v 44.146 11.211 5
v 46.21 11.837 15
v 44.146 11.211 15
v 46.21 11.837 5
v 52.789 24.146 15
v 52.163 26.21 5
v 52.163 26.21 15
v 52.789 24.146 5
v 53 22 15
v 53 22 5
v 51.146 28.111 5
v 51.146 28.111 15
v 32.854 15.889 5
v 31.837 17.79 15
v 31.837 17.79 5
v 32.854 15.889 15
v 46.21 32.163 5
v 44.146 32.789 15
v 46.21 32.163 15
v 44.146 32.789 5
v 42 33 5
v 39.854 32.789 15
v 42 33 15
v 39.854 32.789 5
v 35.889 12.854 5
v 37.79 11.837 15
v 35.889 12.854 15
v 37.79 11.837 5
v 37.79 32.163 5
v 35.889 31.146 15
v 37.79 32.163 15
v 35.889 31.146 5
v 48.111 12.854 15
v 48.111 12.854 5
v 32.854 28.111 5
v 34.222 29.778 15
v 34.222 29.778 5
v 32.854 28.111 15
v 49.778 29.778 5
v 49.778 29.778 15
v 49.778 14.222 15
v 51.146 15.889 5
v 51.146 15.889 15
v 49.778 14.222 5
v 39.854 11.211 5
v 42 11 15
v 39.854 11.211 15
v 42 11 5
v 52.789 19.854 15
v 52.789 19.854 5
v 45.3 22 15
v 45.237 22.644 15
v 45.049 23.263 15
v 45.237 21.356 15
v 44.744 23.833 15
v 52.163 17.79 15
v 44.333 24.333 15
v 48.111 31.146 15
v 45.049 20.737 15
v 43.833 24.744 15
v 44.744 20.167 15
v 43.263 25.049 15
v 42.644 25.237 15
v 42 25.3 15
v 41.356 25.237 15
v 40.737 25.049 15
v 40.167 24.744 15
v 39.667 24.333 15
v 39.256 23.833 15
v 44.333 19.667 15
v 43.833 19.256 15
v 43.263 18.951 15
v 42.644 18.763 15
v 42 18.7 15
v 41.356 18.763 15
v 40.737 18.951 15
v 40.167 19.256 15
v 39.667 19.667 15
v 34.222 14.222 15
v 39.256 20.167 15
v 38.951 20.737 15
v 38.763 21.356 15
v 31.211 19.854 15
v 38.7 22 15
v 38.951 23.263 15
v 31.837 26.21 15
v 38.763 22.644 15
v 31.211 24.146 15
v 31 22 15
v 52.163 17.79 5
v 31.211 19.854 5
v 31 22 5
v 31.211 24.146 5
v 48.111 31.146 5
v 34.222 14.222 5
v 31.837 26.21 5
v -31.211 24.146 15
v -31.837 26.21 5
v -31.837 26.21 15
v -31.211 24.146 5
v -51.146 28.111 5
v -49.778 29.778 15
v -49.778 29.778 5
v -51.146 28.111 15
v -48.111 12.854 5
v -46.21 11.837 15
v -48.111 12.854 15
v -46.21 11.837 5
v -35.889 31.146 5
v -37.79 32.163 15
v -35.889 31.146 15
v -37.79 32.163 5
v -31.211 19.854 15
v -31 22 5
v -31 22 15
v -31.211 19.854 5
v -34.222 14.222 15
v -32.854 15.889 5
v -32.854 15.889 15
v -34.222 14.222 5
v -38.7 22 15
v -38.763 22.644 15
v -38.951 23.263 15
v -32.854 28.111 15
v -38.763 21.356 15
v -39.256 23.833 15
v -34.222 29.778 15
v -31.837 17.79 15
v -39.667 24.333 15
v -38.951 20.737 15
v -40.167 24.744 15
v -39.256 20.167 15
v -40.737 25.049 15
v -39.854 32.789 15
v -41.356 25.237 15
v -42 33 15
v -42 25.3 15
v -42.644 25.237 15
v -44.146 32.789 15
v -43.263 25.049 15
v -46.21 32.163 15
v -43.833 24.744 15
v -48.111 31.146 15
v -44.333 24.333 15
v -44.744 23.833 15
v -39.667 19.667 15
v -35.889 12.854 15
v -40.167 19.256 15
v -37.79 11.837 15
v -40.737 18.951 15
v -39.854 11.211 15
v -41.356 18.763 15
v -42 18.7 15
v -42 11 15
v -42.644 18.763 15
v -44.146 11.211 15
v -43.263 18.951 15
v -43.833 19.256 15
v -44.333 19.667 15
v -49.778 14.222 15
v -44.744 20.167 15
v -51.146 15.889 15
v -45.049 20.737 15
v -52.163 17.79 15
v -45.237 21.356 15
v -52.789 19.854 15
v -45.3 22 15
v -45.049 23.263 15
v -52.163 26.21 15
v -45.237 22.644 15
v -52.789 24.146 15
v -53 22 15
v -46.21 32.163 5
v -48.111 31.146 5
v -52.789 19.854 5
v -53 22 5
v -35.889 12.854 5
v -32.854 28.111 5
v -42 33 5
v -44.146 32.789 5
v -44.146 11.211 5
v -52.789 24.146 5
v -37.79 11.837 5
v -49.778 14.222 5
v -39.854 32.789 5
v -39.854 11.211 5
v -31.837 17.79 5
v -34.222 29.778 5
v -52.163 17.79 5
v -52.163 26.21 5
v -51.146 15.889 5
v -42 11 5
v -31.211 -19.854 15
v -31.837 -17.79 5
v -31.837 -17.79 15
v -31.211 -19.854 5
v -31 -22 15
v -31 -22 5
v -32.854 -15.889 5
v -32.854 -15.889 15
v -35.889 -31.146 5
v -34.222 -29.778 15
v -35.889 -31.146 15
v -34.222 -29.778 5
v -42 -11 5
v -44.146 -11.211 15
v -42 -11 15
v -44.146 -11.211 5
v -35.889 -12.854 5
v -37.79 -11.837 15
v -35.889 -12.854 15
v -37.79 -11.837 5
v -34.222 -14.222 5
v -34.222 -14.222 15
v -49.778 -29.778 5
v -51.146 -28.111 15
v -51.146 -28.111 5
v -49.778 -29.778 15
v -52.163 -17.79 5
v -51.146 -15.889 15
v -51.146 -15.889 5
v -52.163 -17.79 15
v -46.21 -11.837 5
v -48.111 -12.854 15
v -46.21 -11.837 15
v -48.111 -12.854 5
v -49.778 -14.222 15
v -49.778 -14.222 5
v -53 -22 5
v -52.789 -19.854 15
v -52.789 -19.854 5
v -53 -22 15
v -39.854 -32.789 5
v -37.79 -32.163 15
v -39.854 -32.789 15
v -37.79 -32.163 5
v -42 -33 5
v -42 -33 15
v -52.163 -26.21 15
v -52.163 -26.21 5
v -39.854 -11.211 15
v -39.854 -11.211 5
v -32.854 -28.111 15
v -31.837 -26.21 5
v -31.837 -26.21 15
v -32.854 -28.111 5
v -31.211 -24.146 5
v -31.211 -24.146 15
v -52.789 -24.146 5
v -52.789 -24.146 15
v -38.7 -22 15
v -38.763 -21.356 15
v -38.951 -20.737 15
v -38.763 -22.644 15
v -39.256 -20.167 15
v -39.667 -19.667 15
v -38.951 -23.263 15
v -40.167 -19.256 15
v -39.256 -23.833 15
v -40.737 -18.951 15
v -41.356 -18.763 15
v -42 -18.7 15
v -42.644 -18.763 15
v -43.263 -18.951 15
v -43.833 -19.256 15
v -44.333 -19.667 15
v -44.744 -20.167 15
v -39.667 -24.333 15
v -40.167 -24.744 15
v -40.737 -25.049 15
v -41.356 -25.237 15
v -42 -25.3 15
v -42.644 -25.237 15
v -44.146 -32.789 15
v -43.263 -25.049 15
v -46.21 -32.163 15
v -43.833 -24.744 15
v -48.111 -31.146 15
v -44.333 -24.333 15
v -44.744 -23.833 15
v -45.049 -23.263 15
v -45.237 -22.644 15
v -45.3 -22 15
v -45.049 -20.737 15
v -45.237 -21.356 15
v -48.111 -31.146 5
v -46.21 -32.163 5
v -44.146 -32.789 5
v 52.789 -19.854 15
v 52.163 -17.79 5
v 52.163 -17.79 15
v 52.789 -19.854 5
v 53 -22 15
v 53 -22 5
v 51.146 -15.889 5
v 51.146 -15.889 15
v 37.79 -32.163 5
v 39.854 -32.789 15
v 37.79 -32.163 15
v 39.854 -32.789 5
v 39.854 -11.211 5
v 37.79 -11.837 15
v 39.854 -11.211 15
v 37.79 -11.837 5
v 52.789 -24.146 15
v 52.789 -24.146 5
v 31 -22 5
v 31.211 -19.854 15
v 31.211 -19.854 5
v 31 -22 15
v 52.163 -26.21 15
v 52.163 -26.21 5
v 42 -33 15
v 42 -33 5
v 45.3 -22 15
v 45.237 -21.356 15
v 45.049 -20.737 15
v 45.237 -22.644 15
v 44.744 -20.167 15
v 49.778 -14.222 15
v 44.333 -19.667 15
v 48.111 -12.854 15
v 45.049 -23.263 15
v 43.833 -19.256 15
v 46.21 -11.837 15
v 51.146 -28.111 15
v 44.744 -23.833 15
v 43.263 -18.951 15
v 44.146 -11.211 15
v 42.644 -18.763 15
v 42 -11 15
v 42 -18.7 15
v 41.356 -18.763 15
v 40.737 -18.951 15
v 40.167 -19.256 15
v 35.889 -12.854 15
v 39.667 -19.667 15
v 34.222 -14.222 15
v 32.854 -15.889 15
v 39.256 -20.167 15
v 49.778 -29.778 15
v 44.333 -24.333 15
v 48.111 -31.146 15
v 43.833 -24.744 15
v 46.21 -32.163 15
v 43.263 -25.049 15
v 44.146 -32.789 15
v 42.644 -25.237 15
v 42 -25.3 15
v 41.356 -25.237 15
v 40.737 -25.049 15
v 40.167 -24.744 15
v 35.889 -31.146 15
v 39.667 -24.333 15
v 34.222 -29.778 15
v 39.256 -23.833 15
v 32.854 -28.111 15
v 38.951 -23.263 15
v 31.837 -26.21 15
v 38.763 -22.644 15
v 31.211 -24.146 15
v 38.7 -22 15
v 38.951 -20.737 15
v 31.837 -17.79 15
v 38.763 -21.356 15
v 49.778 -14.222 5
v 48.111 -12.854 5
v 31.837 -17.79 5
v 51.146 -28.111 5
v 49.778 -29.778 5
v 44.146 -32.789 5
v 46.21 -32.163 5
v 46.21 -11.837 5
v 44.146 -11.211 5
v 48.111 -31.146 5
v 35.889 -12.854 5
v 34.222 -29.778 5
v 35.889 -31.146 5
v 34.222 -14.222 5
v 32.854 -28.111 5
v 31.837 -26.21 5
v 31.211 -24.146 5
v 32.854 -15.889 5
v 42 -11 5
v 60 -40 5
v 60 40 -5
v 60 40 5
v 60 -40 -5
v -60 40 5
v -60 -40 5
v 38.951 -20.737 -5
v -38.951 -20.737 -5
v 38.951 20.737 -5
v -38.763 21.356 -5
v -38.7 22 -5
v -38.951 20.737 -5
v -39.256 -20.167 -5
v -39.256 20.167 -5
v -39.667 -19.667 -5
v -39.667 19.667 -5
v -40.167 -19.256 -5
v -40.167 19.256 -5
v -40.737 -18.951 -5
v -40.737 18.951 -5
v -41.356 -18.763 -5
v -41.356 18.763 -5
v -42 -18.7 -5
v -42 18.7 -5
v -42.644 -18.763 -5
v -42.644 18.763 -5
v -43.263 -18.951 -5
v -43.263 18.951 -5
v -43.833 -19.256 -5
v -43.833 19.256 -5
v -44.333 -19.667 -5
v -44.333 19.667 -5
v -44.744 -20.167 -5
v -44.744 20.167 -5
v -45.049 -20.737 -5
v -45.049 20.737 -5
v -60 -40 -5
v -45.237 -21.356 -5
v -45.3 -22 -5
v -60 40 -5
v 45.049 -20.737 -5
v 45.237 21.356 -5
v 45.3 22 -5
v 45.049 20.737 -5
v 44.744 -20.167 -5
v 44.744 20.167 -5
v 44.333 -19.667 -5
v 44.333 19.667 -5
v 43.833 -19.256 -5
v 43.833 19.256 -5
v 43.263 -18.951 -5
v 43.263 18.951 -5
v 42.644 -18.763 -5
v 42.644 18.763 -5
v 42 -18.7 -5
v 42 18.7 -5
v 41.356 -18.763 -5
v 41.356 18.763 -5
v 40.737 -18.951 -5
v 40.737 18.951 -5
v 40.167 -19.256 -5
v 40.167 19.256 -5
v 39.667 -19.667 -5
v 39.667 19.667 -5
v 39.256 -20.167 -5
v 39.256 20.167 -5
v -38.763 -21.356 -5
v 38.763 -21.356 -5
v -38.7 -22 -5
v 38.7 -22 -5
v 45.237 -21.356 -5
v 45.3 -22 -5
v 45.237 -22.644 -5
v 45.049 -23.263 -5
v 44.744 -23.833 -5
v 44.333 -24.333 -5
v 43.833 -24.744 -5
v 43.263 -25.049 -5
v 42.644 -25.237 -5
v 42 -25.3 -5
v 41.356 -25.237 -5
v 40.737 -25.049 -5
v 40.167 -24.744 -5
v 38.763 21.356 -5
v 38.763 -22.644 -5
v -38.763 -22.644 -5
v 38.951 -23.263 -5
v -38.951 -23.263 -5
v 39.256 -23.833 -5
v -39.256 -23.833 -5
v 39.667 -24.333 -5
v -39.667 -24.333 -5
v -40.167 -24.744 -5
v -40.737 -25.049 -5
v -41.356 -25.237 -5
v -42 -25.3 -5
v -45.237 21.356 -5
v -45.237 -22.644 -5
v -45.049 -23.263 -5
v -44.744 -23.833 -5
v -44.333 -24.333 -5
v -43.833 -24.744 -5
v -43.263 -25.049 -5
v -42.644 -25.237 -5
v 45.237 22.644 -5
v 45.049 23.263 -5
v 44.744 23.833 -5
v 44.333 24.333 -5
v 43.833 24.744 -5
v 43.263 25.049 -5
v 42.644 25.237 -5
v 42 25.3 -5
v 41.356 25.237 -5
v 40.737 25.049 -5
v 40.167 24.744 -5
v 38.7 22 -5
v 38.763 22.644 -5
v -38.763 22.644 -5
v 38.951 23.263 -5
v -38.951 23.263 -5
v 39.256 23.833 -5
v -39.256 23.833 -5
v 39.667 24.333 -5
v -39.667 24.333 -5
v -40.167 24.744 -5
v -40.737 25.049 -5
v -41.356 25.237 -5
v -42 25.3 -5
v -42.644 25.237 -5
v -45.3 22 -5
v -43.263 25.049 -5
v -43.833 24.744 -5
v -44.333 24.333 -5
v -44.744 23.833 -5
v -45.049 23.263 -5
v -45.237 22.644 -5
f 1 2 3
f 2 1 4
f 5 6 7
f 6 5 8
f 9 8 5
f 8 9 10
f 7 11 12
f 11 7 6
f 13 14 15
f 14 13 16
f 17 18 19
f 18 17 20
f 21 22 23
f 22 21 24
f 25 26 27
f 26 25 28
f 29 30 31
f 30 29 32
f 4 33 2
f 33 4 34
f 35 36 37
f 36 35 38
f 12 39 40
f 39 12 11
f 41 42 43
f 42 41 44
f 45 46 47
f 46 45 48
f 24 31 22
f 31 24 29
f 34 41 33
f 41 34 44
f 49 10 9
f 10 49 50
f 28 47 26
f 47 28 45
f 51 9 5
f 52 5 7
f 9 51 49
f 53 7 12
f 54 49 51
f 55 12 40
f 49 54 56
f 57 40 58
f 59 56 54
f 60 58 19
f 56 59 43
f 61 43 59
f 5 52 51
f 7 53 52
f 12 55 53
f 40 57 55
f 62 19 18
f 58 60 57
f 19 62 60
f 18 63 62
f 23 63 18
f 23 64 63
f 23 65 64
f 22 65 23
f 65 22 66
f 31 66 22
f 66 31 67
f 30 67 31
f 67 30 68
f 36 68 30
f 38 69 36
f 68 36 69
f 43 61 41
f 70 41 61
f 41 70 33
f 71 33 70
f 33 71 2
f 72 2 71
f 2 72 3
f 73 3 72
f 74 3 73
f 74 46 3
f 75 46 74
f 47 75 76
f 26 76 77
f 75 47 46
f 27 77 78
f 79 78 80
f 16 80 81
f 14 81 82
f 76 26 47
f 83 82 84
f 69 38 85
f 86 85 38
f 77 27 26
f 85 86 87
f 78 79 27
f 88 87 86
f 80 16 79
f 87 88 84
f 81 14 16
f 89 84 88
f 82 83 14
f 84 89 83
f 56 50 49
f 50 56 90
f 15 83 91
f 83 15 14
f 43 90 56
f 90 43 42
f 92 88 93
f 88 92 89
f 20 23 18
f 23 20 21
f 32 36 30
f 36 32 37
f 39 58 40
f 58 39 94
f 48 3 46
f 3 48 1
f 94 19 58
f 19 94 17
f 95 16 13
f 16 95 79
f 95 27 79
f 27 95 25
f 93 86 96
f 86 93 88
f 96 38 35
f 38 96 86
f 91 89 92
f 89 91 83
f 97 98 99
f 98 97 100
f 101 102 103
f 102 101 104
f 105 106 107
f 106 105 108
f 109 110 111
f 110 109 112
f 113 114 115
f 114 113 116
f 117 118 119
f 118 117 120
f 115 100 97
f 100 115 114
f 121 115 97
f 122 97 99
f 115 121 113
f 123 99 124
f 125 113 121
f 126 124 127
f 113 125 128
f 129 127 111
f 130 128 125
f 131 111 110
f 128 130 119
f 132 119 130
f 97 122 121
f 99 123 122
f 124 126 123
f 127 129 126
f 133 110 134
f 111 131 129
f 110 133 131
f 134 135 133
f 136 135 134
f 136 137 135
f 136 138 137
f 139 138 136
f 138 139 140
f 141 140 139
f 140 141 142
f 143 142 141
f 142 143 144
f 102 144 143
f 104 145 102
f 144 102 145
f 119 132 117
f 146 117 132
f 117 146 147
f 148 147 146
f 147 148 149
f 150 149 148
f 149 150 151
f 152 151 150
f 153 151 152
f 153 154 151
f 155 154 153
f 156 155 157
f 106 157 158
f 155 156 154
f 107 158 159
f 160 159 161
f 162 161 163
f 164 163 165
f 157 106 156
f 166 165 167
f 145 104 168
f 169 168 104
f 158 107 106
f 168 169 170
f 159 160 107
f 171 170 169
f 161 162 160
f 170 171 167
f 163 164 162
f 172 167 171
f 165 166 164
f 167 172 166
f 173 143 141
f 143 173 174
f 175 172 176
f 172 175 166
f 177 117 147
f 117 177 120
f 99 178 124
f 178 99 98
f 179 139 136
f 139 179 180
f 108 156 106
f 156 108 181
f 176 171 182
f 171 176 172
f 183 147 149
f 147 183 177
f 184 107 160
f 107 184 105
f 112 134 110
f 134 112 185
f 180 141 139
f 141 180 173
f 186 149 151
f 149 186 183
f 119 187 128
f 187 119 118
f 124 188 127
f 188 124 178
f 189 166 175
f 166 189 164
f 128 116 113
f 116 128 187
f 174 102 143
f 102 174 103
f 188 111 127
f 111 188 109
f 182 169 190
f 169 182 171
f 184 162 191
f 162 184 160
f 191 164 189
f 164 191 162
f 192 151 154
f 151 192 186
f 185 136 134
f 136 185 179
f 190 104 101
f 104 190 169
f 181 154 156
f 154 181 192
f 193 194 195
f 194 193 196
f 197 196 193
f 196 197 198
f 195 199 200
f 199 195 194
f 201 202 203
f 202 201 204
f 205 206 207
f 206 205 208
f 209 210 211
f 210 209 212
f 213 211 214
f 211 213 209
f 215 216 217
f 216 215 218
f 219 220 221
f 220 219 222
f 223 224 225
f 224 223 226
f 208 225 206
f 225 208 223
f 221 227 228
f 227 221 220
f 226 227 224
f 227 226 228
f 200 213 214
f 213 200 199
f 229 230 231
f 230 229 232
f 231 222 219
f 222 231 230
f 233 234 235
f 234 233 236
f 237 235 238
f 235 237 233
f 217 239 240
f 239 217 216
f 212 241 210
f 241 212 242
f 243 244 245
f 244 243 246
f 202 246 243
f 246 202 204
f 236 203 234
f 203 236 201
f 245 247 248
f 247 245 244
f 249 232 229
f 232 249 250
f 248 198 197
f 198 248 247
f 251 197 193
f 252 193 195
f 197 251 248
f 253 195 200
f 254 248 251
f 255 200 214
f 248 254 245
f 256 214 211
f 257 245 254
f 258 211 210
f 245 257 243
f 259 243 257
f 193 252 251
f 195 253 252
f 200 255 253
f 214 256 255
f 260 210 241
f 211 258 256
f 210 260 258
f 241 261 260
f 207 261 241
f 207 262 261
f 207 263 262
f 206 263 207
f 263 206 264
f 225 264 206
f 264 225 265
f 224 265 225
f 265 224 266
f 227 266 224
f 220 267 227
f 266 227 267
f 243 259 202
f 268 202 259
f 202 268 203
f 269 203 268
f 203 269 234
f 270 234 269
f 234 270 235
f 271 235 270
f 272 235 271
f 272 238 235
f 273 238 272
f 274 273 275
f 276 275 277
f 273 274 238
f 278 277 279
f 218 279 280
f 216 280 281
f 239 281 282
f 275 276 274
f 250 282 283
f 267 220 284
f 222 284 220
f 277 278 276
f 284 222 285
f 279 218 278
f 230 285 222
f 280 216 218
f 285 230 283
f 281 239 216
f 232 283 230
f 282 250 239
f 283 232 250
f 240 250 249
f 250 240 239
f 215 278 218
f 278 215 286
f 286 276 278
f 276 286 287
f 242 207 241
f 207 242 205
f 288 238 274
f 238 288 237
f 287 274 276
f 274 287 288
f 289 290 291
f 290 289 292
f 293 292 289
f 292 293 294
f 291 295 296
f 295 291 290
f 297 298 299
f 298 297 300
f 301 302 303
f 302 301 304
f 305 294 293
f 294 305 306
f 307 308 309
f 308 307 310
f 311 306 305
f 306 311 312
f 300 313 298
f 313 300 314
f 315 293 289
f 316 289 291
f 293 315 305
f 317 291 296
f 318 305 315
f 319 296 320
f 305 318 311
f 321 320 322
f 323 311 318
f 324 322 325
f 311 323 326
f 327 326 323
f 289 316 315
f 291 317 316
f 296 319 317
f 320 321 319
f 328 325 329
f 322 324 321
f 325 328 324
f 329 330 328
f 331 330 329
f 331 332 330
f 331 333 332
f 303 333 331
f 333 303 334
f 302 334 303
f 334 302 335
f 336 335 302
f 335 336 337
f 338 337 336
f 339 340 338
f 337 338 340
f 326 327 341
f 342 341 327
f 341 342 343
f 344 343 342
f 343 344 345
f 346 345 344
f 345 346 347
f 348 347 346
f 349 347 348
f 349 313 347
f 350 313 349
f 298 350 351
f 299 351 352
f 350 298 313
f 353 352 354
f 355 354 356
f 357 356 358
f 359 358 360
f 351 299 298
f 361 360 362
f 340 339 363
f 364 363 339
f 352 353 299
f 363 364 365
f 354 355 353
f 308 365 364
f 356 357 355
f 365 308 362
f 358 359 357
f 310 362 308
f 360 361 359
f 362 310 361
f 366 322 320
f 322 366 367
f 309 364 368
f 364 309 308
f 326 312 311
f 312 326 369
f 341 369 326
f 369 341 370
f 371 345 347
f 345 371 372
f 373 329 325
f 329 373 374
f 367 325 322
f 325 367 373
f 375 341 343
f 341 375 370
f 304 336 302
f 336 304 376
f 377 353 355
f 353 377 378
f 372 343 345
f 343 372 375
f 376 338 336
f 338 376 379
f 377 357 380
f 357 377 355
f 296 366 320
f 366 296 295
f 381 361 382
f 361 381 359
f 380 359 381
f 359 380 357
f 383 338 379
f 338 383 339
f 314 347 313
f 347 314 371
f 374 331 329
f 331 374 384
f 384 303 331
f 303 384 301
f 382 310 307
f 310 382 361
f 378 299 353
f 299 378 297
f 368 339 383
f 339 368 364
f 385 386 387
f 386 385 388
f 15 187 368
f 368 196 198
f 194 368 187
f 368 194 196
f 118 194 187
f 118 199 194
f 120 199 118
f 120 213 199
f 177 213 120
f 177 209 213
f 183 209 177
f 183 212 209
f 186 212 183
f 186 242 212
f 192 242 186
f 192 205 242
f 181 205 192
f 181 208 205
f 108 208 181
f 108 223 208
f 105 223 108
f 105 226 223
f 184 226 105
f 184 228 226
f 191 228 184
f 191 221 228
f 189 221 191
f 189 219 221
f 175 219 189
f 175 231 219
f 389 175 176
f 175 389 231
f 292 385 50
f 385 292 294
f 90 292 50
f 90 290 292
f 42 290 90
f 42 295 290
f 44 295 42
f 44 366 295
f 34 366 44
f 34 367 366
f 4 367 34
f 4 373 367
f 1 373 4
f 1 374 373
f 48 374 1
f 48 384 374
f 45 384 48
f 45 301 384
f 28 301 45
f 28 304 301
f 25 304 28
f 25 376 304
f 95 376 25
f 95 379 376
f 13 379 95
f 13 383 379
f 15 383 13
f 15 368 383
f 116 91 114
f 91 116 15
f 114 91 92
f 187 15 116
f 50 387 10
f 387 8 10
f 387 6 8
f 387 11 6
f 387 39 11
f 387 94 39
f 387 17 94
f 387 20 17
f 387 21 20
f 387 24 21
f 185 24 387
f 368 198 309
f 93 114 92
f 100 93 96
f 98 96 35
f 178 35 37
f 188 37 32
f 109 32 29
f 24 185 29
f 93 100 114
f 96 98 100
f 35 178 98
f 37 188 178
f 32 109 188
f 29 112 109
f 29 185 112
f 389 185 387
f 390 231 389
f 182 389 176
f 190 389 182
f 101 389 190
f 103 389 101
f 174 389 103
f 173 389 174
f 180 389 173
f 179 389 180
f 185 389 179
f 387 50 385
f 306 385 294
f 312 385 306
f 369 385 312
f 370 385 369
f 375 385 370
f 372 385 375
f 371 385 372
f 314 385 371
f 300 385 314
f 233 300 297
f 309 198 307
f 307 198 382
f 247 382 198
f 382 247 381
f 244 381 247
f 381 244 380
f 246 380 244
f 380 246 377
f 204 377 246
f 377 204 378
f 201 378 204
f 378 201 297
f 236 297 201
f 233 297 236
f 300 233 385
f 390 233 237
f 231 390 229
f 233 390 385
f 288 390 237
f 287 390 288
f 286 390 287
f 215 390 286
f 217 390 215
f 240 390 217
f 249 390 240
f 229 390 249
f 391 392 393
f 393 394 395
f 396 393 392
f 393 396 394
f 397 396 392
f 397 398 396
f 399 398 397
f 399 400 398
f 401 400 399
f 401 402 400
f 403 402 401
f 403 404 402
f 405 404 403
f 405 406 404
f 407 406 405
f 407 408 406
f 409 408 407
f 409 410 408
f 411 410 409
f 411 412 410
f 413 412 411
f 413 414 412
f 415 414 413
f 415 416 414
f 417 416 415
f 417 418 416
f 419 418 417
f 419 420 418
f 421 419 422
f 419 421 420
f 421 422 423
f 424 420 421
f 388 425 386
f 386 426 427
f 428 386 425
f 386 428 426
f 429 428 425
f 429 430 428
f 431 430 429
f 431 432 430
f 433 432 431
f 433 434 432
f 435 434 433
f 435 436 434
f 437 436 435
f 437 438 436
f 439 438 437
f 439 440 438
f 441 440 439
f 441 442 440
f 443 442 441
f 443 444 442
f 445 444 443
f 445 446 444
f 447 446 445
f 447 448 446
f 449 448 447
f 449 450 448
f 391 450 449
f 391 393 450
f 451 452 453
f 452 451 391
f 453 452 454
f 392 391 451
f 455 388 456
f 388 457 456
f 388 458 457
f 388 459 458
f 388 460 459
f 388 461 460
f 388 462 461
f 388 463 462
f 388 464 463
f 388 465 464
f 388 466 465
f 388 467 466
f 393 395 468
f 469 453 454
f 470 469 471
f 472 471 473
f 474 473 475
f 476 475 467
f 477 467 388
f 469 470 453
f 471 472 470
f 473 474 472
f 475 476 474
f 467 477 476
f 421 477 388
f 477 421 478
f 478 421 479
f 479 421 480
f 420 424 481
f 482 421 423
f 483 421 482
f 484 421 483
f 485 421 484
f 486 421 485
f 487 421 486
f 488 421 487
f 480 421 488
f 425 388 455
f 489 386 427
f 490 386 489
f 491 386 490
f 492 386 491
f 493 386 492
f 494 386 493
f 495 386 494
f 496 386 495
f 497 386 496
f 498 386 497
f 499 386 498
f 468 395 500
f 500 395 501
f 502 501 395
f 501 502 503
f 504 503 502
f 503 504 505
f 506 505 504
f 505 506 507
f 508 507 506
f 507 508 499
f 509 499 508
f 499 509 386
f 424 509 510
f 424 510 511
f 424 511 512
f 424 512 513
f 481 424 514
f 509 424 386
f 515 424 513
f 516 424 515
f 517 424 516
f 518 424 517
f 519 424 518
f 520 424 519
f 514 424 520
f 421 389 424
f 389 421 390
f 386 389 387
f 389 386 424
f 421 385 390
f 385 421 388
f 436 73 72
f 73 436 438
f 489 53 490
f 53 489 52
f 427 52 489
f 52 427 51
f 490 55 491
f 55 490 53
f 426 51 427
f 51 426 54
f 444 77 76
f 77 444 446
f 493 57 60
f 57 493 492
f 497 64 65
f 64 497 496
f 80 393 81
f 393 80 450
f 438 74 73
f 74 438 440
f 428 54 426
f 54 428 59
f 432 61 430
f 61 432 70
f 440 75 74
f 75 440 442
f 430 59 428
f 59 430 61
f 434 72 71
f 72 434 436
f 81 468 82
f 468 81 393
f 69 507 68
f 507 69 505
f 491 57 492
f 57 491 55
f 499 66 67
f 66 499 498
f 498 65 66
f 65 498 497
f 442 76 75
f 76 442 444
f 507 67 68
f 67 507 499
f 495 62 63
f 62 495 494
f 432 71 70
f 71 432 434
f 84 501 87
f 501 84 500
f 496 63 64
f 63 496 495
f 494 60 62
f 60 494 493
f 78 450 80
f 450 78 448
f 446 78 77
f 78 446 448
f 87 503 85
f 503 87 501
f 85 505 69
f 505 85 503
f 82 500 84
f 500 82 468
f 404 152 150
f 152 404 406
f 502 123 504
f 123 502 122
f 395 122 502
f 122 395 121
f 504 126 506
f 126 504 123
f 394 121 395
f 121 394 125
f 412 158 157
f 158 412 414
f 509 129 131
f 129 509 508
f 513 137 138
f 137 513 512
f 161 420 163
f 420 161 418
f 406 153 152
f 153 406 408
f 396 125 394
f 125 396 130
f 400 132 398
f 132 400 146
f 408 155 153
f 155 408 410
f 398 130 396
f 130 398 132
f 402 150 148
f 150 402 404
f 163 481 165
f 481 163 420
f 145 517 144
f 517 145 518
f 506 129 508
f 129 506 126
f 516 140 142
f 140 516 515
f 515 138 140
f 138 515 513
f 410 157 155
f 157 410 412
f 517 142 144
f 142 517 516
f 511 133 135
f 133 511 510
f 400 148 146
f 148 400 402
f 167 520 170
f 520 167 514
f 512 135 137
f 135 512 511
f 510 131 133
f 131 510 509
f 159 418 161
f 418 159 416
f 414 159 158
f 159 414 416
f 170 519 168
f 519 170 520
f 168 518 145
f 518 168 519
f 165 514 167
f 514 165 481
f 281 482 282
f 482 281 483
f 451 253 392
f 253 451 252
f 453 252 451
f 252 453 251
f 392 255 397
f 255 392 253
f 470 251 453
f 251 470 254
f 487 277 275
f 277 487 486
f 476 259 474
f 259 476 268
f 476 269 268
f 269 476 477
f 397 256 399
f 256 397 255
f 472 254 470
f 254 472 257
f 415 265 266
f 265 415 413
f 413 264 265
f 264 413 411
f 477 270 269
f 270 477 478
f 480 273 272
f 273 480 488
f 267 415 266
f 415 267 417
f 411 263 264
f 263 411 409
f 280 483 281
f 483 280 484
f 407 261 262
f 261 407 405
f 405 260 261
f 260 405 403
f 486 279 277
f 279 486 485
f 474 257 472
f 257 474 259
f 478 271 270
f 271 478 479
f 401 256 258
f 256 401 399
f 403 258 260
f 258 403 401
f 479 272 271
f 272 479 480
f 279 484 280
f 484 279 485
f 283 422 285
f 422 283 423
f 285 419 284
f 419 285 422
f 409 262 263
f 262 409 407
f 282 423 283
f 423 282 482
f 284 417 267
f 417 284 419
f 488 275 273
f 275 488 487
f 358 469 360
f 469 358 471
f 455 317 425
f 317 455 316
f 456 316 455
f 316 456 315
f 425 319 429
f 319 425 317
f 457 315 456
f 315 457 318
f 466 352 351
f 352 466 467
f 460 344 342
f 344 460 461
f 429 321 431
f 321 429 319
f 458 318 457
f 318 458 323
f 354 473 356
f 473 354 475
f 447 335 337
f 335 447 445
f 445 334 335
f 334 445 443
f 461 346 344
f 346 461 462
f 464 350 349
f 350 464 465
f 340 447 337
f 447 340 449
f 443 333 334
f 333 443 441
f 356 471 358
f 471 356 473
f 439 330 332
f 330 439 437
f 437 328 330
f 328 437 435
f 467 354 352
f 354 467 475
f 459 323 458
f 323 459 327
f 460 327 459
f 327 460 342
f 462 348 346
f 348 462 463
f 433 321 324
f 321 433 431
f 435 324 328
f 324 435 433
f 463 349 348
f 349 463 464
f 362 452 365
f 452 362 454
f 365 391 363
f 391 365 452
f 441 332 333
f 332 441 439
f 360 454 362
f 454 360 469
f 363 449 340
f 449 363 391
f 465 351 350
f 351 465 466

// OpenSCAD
$fn = 32;

// ----------------------------------------------------------------------
// Anchor pads 120 x 80 x 20
// four corner bosses with anchor holes
// ----------------------------------------------------------------------

// --- parameters (mm) ---
plate = [120, 80, 10];  // base plate size (x, y, z)
pads = 4;               // boss count, one per corner
edge = 18;              // boss centre offset from the plate edge
boss_d = 22;            // boss diameter
boss_h = 10;            // boss height above the base plate
hole_d = 6.6;           // hole diameter

// --- derived feature positions (mm) ---
height = plate[2] + boss_h;      // = 20   overall height of the part
corner_x = plate[0] / 2 - edge;  // = 42   boss centre X
corner_y = plate[1] / 2 - edge;  // = 22   boss centre Y
feature_centers = [
  [corner_x, corner_y],
  [-corner_x, corner_y],
  [-corner_x, -corner_y],
  [corner_x, -corner_y]
];   // boss centres, anchor holes are drilled there

// base plate, four bosses standing on it, anchor holes all the way through
difference() {
  union() {
    cube(plate, center = true);
    for (centre = feature_centers)
      translate([centre[0], centre[1], plate[2] / 2 - 1])
        cylinder(d = boss_d, h = boss_h + 1);
  }
  for (centre = feature_centers)
    translate([centre[0], centre[1], -height])
      cylinder(d = hole_d, h = 2 * height + 2);  // through boss and plate
}
